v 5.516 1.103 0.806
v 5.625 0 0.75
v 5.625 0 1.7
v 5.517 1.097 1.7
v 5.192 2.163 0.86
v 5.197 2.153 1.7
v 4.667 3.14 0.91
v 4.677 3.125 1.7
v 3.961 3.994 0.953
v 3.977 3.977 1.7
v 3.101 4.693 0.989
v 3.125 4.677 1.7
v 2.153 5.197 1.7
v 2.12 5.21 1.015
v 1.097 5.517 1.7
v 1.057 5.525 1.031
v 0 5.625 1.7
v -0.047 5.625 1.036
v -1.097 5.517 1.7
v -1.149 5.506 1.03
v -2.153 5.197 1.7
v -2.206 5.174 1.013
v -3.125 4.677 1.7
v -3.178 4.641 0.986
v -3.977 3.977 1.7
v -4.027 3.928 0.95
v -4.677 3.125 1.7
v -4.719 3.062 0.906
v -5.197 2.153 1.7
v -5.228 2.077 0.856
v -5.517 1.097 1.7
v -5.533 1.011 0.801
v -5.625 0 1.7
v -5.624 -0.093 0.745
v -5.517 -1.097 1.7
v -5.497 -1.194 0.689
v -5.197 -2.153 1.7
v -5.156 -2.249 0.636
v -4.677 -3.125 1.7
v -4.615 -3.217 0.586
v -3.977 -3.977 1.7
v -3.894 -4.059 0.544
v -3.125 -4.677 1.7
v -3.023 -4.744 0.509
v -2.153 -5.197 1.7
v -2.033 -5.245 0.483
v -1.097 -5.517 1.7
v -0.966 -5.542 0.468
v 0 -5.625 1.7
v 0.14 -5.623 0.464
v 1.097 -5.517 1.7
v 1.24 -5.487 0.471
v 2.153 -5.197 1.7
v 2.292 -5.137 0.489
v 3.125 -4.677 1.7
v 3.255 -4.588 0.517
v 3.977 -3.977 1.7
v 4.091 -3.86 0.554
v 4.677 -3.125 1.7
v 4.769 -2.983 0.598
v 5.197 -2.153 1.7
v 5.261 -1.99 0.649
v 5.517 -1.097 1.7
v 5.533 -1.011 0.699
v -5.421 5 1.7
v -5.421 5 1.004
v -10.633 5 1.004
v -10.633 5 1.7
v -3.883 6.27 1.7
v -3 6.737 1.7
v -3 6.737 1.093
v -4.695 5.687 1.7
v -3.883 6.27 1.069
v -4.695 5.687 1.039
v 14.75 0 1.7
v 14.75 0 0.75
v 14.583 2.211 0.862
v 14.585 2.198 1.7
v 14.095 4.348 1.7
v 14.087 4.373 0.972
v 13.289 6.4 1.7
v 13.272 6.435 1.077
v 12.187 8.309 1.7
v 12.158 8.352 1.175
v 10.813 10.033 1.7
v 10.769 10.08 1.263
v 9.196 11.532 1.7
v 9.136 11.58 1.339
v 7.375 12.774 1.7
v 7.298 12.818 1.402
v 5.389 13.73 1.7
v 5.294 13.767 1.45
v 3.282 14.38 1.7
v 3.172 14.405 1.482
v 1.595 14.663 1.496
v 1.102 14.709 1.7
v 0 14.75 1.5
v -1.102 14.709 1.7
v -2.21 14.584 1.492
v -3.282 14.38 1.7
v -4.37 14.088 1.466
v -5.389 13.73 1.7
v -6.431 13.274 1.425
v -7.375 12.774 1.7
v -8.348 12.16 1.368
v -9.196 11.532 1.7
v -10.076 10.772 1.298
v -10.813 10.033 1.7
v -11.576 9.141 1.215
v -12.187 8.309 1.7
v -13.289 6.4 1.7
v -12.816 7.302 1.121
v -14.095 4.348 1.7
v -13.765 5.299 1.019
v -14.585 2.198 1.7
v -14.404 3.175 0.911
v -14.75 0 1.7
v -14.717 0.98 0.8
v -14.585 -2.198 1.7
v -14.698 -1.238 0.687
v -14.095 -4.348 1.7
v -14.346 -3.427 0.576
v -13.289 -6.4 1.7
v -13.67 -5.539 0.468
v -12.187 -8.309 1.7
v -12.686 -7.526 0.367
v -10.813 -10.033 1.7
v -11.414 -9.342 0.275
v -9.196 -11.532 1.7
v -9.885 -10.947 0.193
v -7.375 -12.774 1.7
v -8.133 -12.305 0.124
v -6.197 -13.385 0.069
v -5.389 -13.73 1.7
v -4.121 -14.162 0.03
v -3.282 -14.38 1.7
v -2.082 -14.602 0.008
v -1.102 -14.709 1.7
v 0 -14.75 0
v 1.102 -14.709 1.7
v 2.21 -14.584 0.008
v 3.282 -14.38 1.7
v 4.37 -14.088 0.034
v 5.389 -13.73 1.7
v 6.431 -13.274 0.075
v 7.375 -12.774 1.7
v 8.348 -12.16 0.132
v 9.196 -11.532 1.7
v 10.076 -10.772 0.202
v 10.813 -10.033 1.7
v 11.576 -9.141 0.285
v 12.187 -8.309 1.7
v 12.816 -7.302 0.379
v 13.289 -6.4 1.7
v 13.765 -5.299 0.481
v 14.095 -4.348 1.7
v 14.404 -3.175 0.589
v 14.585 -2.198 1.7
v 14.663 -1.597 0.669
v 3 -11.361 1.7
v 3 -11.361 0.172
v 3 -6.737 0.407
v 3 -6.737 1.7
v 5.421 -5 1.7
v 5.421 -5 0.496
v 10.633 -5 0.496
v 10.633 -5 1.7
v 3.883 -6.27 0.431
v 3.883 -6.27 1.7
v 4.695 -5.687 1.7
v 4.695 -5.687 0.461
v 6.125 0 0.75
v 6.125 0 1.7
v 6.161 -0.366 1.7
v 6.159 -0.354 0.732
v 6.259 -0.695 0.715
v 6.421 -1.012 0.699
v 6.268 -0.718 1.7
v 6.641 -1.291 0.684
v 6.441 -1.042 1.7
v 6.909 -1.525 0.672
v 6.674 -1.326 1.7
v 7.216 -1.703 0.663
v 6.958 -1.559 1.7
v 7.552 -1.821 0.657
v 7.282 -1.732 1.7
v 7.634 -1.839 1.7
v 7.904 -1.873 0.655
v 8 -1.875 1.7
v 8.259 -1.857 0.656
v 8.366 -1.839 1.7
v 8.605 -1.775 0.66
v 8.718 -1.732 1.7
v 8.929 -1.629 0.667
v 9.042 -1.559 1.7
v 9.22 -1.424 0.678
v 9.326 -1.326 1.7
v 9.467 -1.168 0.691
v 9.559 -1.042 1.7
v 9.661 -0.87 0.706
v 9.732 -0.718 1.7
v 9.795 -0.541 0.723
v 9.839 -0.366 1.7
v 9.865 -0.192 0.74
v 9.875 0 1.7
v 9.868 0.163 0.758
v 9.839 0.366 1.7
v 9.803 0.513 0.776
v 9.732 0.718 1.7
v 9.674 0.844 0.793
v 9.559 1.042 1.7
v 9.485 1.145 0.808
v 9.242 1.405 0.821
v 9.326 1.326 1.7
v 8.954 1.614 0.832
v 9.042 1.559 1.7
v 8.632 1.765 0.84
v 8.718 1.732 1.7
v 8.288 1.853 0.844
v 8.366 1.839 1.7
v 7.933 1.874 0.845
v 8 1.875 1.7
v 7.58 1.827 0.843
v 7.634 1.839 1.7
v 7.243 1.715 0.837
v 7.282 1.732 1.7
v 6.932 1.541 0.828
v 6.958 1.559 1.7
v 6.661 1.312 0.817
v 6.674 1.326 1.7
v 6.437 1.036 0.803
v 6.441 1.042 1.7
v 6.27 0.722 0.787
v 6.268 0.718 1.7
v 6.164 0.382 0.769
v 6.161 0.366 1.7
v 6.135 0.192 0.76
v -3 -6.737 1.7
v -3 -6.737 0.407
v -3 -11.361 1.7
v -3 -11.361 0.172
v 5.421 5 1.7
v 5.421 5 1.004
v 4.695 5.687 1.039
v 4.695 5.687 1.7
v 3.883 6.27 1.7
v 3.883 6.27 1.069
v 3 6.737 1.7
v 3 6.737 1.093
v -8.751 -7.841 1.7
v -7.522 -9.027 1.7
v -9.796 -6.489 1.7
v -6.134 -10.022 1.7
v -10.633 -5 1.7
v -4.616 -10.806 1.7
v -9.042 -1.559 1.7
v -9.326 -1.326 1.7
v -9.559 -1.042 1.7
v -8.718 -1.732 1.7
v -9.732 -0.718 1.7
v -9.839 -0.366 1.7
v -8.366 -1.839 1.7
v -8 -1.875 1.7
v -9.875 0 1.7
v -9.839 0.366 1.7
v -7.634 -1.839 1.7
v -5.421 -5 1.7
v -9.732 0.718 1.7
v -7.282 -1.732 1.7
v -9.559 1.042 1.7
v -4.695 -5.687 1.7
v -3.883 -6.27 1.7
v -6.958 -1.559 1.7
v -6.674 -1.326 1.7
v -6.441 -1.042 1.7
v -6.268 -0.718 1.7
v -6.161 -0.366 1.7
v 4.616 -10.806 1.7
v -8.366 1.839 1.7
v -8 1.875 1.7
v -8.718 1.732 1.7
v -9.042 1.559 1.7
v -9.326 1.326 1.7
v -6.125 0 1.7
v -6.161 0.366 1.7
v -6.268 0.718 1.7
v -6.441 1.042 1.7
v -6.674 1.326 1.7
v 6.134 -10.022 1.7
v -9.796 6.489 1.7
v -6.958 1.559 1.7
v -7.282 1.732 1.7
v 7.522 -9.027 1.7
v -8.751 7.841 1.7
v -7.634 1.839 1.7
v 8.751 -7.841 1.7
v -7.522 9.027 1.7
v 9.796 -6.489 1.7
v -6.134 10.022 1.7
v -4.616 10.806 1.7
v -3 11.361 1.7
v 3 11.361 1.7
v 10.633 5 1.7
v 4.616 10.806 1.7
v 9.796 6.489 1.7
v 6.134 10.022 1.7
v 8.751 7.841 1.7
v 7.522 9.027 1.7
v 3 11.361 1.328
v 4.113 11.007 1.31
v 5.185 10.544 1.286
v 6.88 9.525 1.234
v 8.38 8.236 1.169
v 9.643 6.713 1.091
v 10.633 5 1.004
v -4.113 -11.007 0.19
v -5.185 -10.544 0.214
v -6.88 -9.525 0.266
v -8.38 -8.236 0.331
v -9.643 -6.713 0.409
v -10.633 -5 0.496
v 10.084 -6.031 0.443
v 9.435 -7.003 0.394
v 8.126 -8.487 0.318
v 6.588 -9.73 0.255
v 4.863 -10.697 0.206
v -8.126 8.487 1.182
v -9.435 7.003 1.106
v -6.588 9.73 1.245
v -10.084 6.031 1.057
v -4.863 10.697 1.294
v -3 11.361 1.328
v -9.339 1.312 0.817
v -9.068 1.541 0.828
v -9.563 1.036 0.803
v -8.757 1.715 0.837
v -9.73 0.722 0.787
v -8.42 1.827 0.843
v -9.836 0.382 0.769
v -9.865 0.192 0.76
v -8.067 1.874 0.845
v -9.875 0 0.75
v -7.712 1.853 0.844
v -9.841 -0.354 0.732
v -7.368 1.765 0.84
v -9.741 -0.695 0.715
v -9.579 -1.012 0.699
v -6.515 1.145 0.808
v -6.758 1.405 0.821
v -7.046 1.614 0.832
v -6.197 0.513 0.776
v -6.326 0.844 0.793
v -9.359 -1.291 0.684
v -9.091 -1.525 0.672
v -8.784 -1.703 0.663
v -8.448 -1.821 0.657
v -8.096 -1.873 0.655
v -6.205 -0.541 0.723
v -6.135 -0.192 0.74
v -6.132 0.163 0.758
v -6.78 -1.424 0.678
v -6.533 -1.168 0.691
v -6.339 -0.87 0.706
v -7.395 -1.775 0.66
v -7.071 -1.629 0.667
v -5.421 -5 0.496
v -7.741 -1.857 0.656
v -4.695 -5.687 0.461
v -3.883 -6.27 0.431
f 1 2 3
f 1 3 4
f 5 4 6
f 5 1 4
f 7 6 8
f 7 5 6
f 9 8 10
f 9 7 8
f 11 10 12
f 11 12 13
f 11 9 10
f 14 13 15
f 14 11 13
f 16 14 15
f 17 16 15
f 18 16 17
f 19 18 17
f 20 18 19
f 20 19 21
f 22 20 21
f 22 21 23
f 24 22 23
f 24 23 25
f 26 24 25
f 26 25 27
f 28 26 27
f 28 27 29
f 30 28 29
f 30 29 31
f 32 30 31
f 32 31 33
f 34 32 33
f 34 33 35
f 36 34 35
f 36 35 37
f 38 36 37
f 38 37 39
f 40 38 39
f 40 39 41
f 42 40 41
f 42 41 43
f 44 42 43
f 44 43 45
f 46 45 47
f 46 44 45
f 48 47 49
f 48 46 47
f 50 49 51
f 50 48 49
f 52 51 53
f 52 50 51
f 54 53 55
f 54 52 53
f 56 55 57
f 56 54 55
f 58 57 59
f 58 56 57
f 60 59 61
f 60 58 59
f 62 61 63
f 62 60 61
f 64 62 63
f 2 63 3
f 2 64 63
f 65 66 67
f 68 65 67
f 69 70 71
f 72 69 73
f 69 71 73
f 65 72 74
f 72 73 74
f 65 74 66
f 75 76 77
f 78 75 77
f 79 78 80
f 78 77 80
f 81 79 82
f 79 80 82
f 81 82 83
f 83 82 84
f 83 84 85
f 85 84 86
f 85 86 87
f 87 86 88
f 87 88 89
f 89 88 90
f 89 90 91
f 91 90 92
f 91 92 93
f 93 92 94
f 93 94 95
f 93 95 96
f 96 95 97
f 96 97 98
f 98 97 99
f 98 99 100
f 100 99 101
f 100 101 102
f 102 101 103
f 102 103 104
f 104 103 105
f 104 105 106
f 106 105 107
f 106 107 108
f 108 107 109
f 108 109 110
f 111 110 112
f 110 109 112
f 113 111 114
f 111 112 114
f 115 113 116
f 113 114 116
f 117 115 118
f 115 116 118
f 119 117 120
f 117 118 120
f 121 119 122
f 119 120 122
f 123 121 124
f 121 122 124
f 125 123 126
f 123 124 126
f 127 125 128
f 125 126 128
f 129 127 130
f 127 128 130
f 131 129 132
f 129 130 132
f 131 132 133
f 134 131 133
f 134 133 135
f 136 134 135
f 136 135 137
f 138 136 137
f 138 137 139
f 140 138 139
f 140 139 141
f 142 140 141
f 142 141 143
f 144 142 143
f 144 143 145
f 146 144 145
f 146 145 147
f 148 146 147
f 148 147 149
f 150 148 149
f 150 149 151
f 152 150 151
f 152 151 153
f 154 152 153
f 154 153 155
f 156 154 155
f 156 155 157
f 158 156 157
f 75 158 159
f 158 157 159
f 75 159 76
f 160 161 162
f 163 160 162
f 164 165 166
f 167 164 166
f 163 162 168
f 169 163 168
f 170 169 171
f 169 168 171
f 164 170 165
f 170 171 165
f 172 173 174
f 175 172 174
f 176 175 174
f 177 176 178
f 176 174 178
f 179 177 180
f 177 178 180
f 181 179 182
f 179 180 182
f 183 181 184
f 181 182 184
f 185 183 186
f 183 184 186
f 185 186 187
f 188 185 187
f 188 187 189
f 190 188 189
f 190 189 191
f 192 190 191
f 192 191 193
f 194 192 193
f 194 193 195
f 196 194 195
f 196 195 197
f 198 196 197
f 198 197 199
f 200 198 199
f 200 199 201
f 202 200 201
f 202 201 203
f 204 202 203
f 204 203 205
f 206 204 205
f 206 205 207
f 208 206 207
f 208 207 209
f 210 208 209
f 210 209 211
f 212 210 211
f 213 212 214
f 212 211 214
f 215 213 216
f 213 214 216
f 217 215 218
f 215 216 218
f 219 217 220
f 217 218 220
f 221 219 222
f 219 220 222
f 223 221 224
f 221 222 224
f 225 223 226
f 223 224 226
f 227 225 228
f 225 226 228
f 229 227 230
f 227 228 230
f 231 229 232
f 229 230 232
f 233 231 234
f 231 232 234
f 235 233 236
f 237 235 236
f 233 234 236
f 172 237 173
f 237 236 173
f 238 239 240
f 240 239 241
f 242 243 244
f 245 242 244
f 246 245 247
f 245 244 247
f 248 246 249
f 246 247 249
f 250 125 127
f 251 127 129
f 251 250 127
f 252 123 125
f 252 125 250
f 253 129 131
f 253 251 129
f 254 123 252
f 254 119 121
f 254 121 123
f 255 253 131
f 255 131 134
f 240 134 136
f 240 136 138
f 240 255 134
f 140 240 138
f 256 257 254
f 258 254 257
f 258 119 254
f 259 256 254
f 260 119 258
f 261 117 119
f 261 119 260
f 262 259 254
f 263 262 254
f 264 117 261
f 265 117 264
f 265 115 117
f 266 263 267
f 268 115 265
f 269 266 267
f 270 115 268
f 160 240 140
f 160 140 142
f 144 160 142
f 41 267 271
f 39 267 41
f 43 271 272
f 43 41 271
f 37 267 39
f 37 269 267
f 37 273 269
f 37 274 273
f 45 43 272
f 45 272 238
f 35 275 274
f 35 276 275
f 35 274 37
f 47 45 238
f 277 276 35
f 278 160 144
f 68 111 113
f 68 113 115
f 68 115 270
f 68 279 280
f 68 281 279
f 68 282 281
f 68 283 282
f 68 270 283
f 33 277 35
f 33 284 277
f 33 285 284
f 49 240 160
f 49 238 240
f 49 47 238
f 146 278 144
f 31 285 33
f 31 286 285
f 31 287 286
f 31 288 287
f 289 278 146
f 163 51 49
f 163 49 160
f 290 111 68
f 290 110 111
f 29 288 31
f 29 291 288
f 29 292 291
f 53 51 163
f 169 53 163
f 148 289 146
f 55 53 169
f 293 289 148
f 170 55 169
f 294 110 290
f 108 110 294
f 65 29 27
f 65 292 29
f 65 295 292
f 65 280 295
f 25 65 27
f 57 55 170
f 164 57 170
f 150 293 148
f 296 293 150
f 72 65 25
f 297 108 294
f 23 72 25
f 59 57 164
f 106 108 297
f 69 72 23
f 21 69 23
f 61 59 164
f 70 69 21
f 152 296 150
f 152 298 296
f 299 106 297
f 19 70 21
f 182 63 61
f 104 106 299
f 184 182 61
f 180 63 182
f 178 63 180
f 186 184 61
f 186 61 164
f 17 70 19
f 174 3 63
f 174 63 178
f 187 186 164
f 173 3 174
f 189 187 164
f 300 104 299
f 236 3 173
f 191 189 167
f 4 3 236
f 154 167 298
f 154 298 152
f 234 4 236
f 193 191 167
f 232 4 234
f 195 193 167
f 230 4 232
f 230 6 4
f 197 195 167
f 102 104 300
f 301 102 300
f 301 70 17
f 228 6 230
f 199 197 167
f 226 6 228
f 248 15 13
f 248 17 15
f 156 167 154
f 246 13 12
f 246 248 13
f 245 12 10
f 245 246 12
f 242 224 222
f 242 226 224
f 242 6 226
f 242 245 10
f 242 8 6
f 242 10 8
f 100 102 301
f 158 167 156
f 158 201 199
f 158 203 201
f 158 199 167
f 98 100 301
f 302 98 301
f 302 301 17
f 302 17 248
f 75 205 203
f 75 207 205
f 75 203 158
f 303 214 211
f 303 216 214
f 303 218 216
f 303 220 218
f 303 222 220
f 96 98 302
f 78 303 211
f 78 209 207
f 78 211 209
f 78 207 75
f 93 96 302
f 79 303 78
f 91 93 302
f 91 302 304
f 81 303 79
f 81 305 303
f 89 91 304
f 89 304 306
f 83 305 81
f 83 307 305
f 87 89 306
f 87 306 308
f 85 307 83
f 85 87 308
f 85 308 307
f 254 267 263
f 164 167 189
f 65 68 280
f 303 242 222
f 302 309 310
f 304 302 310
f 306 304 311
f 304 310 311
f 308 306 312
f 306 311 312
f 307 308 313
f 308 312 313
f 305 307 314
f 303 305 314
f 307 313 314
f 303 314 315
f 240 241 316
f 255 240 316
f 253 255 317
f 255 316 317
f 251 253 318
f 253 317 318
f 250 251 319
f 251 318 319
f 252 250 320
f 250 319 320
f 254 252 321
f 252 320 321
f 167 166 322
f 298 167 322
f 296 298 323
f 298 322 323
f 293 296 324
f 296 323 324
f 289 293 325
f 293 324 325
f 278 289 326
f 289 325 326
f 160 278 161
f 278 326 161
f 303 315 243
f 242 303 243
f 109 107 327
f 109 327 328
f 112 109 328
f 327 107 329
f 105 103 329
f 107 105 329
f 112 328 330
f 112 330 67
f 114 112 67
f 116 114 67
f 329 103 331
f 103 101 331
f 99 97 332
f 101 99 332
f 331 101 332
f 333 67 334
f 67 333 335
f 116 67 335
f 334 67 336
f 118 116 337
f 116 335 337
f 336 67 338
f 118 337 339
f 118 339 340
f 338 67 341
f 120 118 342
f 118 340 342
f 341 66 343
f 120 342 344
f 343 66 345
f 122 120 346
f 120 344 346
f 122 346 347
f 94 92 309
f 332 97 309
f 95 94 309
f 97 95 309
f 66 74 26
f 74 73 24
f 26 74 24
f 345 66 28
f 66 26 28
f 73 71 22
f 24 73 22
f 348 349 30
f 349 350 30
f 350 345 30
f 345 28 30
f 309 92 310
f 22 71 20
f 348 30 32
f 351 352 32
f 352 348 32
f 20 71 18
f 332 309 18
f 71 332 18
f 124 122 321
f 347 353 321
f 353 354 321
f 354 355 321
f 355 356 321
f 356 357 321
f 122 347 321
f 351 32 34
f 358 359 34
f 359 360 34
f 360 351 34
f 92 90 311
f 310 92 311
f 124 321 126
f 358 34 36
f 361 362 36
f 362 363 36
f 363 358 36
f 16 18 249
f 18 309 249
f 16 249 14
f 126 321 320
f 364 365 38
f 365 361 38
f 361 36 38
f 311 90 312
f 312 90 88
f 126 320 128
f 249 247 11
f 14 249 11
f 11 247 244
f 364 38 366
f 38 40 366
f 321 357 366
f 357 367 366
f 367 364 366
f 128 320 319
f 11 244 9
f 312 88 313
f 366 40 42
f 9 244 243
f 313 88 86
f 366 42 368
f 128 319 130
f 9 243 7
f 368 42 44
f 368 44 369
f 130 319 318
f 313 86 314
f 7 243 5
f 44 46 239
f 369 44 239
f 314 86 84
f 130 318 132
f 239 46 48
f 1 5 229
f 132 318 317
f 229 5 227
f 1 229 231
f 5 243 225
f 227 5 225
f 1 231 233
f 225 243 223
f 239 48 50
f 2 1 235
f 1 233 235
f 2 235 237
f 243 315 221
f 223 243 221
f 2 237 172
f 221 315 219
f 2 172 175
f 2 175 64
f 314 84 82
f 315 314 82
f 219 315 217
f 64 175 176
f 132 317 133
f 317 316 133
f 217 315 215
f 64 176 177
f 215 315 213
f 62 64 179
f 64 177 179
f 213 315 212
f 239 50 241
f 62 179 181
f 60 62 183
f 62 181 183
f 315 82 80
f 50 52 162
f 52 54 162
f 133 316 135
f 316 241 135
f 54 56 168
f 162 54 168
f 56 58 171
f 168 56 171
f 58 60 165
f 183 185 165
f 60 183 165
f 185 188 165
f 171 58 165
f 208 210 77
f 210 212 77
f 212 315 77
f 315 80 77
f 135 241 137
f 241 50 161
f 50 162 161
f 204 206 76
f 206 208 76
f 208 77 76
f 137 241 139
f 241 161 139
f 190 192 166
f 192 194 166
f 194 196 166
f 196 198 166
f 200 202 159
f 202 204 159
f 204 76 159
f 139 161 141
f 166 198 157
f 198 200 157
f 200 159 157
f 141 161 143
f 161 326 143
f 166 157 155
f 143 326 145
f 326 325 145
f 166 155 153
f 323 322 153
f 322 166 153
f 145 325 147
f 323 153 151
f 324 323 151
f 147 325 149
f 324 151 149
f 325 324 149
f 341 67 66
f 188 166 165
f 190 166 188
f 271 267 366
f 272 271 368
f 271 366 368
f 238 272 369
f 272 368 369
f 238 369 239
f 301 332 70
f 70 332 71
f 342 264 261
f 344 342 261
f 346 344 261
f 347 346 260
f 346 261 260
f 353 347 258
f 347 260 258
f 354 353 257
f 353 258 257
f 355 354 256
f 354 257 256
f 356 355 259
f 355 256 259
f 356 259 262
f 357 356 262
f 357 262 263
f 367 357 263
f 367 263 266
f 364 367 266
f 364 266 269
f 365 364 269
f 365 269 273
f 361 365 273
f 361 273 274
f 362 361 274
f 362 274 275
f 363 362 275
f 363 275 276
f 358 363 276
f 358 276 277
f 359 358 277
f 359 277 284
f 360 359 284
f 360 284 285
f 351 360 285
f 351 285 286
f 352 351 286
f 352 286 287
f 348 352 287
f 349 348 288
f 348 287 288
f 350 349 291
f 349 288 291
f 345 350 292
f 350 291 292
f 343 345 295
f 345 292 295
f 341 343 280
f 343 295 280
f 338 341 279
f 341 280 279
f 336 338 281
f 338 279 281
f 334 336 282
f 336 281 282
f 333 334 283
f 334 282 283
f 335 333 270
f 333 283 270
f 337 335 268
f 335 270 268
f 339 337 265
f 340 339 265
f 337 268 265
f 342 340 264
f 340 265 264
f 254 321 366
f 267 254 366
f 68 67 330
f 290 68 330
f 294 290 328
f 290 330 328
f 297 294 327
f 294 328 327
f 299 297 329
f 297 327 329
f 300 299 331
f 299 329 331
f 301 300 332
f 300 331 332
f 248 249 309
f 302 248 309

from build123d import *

# Parameters (mm, degrees)
F0_R     = 14.75
F0_R_2   = 5.625
F1_DEPTH = 1.7
F2_D     = 3.75
F4_DEPTH = 15


with BuildPart() as f1:
    # F0 (on Top) → F1 (new body)
    with BuildSketch(Plane.XY):
        Circle(F0_R)
        with BuildLine():
            ThreePointArc((10.633085, 5), (11.467372, 2.561616), (11.75, 0))
            ThreePointArc((11.75, 0), (11.467372, -2.561616), (10.633085, -5))
            ThreePointArc((10.633085, -5), (7.521932, -9.026796), (3, -11.360568))
            ThreePointArc((3, -11.360568), (0, -11.75), (-3, -11.360568))
            ThreePointArc((-3, -11.360568), (-7.521932, -9.026796), (-10.633085, -5))
            ThreePointArc((-10.633085, -5), (-11.75, 0), (-10.633085, 5))
            ThreePointArc((-10.633085, 5), (-7.521932, 9.026796), (-3, 11.360568))
            ThreePointArc((-3, 11.360568), (0, 11.75), (3, 11.360568))
            ThreePointArc((3, 11.360568), (7.521932, 9.026796), (10.633085, 5))
        make_face(mode=Mode.SUBTRACT)
        with BuildLine():
            ThreePointArc((7.375, 0), (6.869236, 2.684069), (5.421312, 5))
            ThreePointArc((5.421312, 5), (4.299318, 5.992202), (3, 6.737256))
            ThreePointArc((3, 6.737256), (0, 7.375), (-3, 6.737256))
            ThreePointArc((-3, 6.737256), (-4.299318, 5.992202), (-5.421312, 5))
            ThreePointArc((-5.421312, 5), (-7.375, 0), (-5.421312, -5))
            ThreePointArc((-5.421312, -5), (-4.299318, -5.992202), (-3, -6.737256))
            ThreePointArc((-3, -6.737256), (0, -7.375), (3, -6.737256))
            ThreePointArc((3, -6.737256), (4.299318, -5.992202), (5.421312, -5))
            ThreePointArc((5.421312, -5), (6.869236, -2.684069), (7.375, 0))
        make_face()
        Circle(F0_R_2, mode=Mode.SUBTRACT)
        with BuildLine():
            Line((3, 6.737256), (3, 11.360568))
            ThreePointArc((3, 11.360568), (0, 11.75), (-3, 11.360568))
            Line((-3, 11.360568), (-3, 6.737256))
            ThreePointArc((-3, 6.737256), (0, 7.375), (3, 6.737256))
        make_face()
        with BuildLine():
            ThreePointArc((-3, -11.360568), (0, -11.75), (3, -11.360568))
            Line((3, -11.360568), (3, -6.737256))
            ThreePointArc((3, -6.737256), (0, -7.375), (-3, -6.737256))
            Line((-3, -6.737256), (-3, -11.360568))
        make_face()
        with BuildLine():
            ThreePointArc((10.633085, -5), (11.467372, -2.561616), (11.75, 0))
            ThreePointArc((11.75, 0), (11.467372, 2.561616), (10.633085, 5))
            Line((10.633085, 5), (5.421312, 5))
            ThreePointArc((5.421312, 5), (6.869236, 2.684069), (7.375, 0))
            ThreePointArc((7.375, 0), (6.869236, -2.684069), (5.421312, -5))
            Line((5.421312, -5), (10.633085, -5))
        make_face()
        with BuildLine():
            Line((-5.421312, 5), (-10.633085, 5))
            ThreePointArc((-10.633085, 5), (-11.75, 0), (-10.633085, -5))
            Line((-10.633085, -5), (-5.421312, -5))
            ThreePointArc((-5.421312, -5), (-7.375, 0), (-5.421312, 5))
        make_face()
    extrude(amount=F1_DEPTH)

    # F2 (through all)
    with Locations(Plane(origin=(0, 0, 0), x_dir=(1, 0, 0), z_dir=(0, 0, -1))):
        with Locations((-8, 0), (8, 0)):
            Hole(F2_D / 2)

    # F3 (on Right) → F4 (cut, symmetric)
    with BuildSketch(Plane.YZ):
        Polygon((14.75, 1.5), (-14.75, 0), (14.75, 0), align=None)
    extrude(amount=F4_DEPTH, both=True, mode=Mode.SUBTRACT)


solid = f1.part
